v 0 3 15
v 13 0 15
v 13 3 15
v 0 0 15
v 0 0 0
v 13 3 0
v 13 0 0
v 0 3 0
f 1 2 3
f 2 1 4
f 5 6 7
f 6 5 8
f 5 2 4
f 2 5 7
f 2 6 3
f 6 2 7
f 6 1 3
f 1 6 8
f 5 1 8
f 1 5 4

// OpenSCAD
// Generated by SolidPython 1.0.1 on 2020-07-29 00:46:55


cube(size = [13, 3, 15]);
/***********************************************
*********      SolidPython code:      **********
************************************************
 
# import packages: SolidPython
from solid import *
from solid.utils import *
from itertools import chain, combinations, permutations


class Resize:

    def __init__(self, scad_file):
        self.scad_file = scad_file
        #self.scad_file = import_scad(scad_file)
        # cone/cylinder param:
        self.r1 = 0
        self.r2 = 0
        self.h = 0
        # rectangular prism param:
        self.w = 0
        self.l = 0
        # ellipse param:
        self.r = 0

    # import OpenScad code (file name corresponds to shape)


    # classify shape + parameters
    def assign(self, param1, param2, param3):
        if self.scad_file == 'cone.scad':
            self.r1 = param1
            self.r2 = param2
            self.h = param3
        elif self.scad_file == 'cylinder.scad':
            self.r1 = param1
            self.r2 = param2
            self.h = param3
        elif self.scad_file == 'rectangularPrism.scad':
            self.h = param1
            self.l = param2
            self.w = param3
        else:
            self.r = param1
            self.h = param2

    # resize parameters
    def iterate(self):
        x = range(3, 20, 2)
        i = 1
        if self.scad_file == 'cone.scad':
            tempList = list(permutations(x, 2))
            for temp in tempList:
                param1 = temp[0]
                param2 = temp[1]
                filepath = 'produced_scad_files/' + 'cone' + str(param1) + '_' + str(param2) + '_' + '.scad'
                scad_render_to_file(cylinder(h=param1, r1=param2, r2=0), filepath)

        elif self.scad_file == 'cylinder.scad':
            tempList = list(permutations(x, 3))
            for temp in tempList:
                param1 = temp[0]
                param2 = temp[1]
                filepath = 'produced_scad_files/' + 'cylinder' + str(param1) + '_' + str(param2) + '_' + '.scad'
                scad_render_to_file(cylinder(h=param1, r1=param2, r2=param2), filepath)

        elif self.scad_file == 'rectangularPrism.scad':
            tempList = list(permutations(x, 3))
            for temp in tempList:
                param1 = temp[0]
                param2 = temp[1]
                param3 = temp[2]
                filepath = 'produced_scad_files/' + 'rectangularPrism' + str(param1) + '_' + str(param2) + '_' + str(
                    param3) + '.scad'
                scad_render_to_file(cube(size=(param1, param2, param3)), filepath)

        elif self.scad_file == 'ellipse.scad':
            tempList = list(permutations(x, 4))
            for temp in tempList:
                param1 = temp[0]
                param2 = temp[1]
                param3 = temp[2]
                param4 = temp[3]
                filepath = 'produced_scad_files/' + 'ellipse' + str(param1) + '_' + str(param2) + '_' + str(param3) + '_' + str(param4) + '.scad'
                scad_render_to_file(scale([param1, param2, param3])(sphere(r=param4)), filepath)

    def render_to_scadfile(self):
        scad_render_to_file(scad, 'example.scad') 
 
************************************************/
